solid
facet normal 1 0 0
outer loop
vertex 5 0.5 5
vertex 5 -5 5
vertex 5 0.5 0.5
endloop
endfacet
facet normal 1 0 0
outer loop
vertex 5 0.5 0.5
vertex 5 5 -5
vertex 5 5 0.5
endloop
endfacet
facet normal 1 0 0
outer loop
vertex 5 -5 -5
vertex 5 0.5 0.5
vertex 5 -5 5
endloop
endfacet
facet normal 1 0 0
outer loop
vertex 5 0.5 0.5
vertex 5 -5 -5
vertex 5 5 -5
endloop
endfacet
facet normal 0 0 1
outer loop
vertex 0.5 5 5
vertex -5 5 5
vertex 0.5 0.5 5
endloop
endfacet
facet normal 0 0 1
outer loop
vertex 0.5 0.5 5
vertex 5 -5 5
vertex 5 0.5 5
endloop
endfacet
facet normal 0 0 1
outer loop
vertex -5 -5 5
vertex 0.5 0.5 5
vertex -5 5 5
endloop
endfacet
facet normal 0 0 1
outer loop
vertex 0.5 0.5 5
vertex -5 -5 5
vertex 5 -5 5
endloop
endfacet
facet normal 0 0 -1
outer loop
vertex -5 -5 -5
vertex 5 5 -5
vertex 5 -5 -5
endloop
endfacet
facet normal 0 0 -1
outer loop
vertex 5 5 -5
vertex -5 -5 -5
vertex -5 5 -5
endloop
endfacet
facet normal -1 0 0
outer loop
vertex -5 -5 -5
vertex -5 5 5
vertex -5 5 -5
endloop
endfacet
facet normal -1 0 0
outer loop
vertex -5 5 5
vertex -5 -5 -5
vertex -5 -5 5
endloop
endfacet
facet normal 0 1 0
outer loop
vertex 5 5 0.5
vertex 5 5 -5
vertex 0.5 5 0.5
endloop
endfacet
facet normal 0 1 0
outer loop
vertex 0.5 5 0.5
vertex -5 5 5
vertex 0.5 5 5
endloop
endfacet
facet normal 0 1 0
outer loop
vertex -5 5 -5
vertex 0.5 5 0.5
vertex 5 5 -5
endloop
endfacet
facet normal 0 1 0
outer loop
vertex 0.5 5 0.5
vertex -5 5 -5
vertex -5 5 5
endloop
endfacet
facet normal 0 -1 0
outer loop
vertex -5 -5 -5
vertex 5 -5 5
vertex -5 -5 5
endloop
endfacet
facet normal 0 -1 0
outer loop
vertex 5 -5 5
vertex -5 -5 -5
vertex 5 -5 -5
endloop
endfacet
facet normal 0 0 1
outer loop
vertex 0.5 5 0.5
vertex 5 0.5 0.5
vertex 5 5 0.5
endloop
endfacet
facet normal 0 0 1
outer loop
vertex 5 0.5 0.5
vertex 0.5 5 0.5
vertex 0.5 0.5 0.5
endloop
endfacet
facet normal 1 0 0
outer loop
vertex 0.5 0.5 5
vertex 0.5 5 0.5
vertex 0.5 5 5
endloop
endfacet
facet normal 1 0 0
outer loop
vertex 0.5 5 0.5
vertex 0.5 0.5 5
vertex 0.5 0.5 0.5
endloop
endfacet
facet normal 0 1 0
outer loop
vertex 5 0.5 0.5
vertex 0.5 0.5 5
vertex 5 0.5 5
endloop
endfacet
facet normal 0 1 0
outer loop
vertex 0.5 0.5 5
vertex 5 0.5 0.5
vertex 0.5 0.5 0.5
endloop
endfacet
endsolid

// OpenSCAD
difference() {
  cube(10, center=true);
  translate([5,5,5]) minkowski(convexity=2) {
    cube(8, center=true);
    cube(1, center=true);
  }
}
